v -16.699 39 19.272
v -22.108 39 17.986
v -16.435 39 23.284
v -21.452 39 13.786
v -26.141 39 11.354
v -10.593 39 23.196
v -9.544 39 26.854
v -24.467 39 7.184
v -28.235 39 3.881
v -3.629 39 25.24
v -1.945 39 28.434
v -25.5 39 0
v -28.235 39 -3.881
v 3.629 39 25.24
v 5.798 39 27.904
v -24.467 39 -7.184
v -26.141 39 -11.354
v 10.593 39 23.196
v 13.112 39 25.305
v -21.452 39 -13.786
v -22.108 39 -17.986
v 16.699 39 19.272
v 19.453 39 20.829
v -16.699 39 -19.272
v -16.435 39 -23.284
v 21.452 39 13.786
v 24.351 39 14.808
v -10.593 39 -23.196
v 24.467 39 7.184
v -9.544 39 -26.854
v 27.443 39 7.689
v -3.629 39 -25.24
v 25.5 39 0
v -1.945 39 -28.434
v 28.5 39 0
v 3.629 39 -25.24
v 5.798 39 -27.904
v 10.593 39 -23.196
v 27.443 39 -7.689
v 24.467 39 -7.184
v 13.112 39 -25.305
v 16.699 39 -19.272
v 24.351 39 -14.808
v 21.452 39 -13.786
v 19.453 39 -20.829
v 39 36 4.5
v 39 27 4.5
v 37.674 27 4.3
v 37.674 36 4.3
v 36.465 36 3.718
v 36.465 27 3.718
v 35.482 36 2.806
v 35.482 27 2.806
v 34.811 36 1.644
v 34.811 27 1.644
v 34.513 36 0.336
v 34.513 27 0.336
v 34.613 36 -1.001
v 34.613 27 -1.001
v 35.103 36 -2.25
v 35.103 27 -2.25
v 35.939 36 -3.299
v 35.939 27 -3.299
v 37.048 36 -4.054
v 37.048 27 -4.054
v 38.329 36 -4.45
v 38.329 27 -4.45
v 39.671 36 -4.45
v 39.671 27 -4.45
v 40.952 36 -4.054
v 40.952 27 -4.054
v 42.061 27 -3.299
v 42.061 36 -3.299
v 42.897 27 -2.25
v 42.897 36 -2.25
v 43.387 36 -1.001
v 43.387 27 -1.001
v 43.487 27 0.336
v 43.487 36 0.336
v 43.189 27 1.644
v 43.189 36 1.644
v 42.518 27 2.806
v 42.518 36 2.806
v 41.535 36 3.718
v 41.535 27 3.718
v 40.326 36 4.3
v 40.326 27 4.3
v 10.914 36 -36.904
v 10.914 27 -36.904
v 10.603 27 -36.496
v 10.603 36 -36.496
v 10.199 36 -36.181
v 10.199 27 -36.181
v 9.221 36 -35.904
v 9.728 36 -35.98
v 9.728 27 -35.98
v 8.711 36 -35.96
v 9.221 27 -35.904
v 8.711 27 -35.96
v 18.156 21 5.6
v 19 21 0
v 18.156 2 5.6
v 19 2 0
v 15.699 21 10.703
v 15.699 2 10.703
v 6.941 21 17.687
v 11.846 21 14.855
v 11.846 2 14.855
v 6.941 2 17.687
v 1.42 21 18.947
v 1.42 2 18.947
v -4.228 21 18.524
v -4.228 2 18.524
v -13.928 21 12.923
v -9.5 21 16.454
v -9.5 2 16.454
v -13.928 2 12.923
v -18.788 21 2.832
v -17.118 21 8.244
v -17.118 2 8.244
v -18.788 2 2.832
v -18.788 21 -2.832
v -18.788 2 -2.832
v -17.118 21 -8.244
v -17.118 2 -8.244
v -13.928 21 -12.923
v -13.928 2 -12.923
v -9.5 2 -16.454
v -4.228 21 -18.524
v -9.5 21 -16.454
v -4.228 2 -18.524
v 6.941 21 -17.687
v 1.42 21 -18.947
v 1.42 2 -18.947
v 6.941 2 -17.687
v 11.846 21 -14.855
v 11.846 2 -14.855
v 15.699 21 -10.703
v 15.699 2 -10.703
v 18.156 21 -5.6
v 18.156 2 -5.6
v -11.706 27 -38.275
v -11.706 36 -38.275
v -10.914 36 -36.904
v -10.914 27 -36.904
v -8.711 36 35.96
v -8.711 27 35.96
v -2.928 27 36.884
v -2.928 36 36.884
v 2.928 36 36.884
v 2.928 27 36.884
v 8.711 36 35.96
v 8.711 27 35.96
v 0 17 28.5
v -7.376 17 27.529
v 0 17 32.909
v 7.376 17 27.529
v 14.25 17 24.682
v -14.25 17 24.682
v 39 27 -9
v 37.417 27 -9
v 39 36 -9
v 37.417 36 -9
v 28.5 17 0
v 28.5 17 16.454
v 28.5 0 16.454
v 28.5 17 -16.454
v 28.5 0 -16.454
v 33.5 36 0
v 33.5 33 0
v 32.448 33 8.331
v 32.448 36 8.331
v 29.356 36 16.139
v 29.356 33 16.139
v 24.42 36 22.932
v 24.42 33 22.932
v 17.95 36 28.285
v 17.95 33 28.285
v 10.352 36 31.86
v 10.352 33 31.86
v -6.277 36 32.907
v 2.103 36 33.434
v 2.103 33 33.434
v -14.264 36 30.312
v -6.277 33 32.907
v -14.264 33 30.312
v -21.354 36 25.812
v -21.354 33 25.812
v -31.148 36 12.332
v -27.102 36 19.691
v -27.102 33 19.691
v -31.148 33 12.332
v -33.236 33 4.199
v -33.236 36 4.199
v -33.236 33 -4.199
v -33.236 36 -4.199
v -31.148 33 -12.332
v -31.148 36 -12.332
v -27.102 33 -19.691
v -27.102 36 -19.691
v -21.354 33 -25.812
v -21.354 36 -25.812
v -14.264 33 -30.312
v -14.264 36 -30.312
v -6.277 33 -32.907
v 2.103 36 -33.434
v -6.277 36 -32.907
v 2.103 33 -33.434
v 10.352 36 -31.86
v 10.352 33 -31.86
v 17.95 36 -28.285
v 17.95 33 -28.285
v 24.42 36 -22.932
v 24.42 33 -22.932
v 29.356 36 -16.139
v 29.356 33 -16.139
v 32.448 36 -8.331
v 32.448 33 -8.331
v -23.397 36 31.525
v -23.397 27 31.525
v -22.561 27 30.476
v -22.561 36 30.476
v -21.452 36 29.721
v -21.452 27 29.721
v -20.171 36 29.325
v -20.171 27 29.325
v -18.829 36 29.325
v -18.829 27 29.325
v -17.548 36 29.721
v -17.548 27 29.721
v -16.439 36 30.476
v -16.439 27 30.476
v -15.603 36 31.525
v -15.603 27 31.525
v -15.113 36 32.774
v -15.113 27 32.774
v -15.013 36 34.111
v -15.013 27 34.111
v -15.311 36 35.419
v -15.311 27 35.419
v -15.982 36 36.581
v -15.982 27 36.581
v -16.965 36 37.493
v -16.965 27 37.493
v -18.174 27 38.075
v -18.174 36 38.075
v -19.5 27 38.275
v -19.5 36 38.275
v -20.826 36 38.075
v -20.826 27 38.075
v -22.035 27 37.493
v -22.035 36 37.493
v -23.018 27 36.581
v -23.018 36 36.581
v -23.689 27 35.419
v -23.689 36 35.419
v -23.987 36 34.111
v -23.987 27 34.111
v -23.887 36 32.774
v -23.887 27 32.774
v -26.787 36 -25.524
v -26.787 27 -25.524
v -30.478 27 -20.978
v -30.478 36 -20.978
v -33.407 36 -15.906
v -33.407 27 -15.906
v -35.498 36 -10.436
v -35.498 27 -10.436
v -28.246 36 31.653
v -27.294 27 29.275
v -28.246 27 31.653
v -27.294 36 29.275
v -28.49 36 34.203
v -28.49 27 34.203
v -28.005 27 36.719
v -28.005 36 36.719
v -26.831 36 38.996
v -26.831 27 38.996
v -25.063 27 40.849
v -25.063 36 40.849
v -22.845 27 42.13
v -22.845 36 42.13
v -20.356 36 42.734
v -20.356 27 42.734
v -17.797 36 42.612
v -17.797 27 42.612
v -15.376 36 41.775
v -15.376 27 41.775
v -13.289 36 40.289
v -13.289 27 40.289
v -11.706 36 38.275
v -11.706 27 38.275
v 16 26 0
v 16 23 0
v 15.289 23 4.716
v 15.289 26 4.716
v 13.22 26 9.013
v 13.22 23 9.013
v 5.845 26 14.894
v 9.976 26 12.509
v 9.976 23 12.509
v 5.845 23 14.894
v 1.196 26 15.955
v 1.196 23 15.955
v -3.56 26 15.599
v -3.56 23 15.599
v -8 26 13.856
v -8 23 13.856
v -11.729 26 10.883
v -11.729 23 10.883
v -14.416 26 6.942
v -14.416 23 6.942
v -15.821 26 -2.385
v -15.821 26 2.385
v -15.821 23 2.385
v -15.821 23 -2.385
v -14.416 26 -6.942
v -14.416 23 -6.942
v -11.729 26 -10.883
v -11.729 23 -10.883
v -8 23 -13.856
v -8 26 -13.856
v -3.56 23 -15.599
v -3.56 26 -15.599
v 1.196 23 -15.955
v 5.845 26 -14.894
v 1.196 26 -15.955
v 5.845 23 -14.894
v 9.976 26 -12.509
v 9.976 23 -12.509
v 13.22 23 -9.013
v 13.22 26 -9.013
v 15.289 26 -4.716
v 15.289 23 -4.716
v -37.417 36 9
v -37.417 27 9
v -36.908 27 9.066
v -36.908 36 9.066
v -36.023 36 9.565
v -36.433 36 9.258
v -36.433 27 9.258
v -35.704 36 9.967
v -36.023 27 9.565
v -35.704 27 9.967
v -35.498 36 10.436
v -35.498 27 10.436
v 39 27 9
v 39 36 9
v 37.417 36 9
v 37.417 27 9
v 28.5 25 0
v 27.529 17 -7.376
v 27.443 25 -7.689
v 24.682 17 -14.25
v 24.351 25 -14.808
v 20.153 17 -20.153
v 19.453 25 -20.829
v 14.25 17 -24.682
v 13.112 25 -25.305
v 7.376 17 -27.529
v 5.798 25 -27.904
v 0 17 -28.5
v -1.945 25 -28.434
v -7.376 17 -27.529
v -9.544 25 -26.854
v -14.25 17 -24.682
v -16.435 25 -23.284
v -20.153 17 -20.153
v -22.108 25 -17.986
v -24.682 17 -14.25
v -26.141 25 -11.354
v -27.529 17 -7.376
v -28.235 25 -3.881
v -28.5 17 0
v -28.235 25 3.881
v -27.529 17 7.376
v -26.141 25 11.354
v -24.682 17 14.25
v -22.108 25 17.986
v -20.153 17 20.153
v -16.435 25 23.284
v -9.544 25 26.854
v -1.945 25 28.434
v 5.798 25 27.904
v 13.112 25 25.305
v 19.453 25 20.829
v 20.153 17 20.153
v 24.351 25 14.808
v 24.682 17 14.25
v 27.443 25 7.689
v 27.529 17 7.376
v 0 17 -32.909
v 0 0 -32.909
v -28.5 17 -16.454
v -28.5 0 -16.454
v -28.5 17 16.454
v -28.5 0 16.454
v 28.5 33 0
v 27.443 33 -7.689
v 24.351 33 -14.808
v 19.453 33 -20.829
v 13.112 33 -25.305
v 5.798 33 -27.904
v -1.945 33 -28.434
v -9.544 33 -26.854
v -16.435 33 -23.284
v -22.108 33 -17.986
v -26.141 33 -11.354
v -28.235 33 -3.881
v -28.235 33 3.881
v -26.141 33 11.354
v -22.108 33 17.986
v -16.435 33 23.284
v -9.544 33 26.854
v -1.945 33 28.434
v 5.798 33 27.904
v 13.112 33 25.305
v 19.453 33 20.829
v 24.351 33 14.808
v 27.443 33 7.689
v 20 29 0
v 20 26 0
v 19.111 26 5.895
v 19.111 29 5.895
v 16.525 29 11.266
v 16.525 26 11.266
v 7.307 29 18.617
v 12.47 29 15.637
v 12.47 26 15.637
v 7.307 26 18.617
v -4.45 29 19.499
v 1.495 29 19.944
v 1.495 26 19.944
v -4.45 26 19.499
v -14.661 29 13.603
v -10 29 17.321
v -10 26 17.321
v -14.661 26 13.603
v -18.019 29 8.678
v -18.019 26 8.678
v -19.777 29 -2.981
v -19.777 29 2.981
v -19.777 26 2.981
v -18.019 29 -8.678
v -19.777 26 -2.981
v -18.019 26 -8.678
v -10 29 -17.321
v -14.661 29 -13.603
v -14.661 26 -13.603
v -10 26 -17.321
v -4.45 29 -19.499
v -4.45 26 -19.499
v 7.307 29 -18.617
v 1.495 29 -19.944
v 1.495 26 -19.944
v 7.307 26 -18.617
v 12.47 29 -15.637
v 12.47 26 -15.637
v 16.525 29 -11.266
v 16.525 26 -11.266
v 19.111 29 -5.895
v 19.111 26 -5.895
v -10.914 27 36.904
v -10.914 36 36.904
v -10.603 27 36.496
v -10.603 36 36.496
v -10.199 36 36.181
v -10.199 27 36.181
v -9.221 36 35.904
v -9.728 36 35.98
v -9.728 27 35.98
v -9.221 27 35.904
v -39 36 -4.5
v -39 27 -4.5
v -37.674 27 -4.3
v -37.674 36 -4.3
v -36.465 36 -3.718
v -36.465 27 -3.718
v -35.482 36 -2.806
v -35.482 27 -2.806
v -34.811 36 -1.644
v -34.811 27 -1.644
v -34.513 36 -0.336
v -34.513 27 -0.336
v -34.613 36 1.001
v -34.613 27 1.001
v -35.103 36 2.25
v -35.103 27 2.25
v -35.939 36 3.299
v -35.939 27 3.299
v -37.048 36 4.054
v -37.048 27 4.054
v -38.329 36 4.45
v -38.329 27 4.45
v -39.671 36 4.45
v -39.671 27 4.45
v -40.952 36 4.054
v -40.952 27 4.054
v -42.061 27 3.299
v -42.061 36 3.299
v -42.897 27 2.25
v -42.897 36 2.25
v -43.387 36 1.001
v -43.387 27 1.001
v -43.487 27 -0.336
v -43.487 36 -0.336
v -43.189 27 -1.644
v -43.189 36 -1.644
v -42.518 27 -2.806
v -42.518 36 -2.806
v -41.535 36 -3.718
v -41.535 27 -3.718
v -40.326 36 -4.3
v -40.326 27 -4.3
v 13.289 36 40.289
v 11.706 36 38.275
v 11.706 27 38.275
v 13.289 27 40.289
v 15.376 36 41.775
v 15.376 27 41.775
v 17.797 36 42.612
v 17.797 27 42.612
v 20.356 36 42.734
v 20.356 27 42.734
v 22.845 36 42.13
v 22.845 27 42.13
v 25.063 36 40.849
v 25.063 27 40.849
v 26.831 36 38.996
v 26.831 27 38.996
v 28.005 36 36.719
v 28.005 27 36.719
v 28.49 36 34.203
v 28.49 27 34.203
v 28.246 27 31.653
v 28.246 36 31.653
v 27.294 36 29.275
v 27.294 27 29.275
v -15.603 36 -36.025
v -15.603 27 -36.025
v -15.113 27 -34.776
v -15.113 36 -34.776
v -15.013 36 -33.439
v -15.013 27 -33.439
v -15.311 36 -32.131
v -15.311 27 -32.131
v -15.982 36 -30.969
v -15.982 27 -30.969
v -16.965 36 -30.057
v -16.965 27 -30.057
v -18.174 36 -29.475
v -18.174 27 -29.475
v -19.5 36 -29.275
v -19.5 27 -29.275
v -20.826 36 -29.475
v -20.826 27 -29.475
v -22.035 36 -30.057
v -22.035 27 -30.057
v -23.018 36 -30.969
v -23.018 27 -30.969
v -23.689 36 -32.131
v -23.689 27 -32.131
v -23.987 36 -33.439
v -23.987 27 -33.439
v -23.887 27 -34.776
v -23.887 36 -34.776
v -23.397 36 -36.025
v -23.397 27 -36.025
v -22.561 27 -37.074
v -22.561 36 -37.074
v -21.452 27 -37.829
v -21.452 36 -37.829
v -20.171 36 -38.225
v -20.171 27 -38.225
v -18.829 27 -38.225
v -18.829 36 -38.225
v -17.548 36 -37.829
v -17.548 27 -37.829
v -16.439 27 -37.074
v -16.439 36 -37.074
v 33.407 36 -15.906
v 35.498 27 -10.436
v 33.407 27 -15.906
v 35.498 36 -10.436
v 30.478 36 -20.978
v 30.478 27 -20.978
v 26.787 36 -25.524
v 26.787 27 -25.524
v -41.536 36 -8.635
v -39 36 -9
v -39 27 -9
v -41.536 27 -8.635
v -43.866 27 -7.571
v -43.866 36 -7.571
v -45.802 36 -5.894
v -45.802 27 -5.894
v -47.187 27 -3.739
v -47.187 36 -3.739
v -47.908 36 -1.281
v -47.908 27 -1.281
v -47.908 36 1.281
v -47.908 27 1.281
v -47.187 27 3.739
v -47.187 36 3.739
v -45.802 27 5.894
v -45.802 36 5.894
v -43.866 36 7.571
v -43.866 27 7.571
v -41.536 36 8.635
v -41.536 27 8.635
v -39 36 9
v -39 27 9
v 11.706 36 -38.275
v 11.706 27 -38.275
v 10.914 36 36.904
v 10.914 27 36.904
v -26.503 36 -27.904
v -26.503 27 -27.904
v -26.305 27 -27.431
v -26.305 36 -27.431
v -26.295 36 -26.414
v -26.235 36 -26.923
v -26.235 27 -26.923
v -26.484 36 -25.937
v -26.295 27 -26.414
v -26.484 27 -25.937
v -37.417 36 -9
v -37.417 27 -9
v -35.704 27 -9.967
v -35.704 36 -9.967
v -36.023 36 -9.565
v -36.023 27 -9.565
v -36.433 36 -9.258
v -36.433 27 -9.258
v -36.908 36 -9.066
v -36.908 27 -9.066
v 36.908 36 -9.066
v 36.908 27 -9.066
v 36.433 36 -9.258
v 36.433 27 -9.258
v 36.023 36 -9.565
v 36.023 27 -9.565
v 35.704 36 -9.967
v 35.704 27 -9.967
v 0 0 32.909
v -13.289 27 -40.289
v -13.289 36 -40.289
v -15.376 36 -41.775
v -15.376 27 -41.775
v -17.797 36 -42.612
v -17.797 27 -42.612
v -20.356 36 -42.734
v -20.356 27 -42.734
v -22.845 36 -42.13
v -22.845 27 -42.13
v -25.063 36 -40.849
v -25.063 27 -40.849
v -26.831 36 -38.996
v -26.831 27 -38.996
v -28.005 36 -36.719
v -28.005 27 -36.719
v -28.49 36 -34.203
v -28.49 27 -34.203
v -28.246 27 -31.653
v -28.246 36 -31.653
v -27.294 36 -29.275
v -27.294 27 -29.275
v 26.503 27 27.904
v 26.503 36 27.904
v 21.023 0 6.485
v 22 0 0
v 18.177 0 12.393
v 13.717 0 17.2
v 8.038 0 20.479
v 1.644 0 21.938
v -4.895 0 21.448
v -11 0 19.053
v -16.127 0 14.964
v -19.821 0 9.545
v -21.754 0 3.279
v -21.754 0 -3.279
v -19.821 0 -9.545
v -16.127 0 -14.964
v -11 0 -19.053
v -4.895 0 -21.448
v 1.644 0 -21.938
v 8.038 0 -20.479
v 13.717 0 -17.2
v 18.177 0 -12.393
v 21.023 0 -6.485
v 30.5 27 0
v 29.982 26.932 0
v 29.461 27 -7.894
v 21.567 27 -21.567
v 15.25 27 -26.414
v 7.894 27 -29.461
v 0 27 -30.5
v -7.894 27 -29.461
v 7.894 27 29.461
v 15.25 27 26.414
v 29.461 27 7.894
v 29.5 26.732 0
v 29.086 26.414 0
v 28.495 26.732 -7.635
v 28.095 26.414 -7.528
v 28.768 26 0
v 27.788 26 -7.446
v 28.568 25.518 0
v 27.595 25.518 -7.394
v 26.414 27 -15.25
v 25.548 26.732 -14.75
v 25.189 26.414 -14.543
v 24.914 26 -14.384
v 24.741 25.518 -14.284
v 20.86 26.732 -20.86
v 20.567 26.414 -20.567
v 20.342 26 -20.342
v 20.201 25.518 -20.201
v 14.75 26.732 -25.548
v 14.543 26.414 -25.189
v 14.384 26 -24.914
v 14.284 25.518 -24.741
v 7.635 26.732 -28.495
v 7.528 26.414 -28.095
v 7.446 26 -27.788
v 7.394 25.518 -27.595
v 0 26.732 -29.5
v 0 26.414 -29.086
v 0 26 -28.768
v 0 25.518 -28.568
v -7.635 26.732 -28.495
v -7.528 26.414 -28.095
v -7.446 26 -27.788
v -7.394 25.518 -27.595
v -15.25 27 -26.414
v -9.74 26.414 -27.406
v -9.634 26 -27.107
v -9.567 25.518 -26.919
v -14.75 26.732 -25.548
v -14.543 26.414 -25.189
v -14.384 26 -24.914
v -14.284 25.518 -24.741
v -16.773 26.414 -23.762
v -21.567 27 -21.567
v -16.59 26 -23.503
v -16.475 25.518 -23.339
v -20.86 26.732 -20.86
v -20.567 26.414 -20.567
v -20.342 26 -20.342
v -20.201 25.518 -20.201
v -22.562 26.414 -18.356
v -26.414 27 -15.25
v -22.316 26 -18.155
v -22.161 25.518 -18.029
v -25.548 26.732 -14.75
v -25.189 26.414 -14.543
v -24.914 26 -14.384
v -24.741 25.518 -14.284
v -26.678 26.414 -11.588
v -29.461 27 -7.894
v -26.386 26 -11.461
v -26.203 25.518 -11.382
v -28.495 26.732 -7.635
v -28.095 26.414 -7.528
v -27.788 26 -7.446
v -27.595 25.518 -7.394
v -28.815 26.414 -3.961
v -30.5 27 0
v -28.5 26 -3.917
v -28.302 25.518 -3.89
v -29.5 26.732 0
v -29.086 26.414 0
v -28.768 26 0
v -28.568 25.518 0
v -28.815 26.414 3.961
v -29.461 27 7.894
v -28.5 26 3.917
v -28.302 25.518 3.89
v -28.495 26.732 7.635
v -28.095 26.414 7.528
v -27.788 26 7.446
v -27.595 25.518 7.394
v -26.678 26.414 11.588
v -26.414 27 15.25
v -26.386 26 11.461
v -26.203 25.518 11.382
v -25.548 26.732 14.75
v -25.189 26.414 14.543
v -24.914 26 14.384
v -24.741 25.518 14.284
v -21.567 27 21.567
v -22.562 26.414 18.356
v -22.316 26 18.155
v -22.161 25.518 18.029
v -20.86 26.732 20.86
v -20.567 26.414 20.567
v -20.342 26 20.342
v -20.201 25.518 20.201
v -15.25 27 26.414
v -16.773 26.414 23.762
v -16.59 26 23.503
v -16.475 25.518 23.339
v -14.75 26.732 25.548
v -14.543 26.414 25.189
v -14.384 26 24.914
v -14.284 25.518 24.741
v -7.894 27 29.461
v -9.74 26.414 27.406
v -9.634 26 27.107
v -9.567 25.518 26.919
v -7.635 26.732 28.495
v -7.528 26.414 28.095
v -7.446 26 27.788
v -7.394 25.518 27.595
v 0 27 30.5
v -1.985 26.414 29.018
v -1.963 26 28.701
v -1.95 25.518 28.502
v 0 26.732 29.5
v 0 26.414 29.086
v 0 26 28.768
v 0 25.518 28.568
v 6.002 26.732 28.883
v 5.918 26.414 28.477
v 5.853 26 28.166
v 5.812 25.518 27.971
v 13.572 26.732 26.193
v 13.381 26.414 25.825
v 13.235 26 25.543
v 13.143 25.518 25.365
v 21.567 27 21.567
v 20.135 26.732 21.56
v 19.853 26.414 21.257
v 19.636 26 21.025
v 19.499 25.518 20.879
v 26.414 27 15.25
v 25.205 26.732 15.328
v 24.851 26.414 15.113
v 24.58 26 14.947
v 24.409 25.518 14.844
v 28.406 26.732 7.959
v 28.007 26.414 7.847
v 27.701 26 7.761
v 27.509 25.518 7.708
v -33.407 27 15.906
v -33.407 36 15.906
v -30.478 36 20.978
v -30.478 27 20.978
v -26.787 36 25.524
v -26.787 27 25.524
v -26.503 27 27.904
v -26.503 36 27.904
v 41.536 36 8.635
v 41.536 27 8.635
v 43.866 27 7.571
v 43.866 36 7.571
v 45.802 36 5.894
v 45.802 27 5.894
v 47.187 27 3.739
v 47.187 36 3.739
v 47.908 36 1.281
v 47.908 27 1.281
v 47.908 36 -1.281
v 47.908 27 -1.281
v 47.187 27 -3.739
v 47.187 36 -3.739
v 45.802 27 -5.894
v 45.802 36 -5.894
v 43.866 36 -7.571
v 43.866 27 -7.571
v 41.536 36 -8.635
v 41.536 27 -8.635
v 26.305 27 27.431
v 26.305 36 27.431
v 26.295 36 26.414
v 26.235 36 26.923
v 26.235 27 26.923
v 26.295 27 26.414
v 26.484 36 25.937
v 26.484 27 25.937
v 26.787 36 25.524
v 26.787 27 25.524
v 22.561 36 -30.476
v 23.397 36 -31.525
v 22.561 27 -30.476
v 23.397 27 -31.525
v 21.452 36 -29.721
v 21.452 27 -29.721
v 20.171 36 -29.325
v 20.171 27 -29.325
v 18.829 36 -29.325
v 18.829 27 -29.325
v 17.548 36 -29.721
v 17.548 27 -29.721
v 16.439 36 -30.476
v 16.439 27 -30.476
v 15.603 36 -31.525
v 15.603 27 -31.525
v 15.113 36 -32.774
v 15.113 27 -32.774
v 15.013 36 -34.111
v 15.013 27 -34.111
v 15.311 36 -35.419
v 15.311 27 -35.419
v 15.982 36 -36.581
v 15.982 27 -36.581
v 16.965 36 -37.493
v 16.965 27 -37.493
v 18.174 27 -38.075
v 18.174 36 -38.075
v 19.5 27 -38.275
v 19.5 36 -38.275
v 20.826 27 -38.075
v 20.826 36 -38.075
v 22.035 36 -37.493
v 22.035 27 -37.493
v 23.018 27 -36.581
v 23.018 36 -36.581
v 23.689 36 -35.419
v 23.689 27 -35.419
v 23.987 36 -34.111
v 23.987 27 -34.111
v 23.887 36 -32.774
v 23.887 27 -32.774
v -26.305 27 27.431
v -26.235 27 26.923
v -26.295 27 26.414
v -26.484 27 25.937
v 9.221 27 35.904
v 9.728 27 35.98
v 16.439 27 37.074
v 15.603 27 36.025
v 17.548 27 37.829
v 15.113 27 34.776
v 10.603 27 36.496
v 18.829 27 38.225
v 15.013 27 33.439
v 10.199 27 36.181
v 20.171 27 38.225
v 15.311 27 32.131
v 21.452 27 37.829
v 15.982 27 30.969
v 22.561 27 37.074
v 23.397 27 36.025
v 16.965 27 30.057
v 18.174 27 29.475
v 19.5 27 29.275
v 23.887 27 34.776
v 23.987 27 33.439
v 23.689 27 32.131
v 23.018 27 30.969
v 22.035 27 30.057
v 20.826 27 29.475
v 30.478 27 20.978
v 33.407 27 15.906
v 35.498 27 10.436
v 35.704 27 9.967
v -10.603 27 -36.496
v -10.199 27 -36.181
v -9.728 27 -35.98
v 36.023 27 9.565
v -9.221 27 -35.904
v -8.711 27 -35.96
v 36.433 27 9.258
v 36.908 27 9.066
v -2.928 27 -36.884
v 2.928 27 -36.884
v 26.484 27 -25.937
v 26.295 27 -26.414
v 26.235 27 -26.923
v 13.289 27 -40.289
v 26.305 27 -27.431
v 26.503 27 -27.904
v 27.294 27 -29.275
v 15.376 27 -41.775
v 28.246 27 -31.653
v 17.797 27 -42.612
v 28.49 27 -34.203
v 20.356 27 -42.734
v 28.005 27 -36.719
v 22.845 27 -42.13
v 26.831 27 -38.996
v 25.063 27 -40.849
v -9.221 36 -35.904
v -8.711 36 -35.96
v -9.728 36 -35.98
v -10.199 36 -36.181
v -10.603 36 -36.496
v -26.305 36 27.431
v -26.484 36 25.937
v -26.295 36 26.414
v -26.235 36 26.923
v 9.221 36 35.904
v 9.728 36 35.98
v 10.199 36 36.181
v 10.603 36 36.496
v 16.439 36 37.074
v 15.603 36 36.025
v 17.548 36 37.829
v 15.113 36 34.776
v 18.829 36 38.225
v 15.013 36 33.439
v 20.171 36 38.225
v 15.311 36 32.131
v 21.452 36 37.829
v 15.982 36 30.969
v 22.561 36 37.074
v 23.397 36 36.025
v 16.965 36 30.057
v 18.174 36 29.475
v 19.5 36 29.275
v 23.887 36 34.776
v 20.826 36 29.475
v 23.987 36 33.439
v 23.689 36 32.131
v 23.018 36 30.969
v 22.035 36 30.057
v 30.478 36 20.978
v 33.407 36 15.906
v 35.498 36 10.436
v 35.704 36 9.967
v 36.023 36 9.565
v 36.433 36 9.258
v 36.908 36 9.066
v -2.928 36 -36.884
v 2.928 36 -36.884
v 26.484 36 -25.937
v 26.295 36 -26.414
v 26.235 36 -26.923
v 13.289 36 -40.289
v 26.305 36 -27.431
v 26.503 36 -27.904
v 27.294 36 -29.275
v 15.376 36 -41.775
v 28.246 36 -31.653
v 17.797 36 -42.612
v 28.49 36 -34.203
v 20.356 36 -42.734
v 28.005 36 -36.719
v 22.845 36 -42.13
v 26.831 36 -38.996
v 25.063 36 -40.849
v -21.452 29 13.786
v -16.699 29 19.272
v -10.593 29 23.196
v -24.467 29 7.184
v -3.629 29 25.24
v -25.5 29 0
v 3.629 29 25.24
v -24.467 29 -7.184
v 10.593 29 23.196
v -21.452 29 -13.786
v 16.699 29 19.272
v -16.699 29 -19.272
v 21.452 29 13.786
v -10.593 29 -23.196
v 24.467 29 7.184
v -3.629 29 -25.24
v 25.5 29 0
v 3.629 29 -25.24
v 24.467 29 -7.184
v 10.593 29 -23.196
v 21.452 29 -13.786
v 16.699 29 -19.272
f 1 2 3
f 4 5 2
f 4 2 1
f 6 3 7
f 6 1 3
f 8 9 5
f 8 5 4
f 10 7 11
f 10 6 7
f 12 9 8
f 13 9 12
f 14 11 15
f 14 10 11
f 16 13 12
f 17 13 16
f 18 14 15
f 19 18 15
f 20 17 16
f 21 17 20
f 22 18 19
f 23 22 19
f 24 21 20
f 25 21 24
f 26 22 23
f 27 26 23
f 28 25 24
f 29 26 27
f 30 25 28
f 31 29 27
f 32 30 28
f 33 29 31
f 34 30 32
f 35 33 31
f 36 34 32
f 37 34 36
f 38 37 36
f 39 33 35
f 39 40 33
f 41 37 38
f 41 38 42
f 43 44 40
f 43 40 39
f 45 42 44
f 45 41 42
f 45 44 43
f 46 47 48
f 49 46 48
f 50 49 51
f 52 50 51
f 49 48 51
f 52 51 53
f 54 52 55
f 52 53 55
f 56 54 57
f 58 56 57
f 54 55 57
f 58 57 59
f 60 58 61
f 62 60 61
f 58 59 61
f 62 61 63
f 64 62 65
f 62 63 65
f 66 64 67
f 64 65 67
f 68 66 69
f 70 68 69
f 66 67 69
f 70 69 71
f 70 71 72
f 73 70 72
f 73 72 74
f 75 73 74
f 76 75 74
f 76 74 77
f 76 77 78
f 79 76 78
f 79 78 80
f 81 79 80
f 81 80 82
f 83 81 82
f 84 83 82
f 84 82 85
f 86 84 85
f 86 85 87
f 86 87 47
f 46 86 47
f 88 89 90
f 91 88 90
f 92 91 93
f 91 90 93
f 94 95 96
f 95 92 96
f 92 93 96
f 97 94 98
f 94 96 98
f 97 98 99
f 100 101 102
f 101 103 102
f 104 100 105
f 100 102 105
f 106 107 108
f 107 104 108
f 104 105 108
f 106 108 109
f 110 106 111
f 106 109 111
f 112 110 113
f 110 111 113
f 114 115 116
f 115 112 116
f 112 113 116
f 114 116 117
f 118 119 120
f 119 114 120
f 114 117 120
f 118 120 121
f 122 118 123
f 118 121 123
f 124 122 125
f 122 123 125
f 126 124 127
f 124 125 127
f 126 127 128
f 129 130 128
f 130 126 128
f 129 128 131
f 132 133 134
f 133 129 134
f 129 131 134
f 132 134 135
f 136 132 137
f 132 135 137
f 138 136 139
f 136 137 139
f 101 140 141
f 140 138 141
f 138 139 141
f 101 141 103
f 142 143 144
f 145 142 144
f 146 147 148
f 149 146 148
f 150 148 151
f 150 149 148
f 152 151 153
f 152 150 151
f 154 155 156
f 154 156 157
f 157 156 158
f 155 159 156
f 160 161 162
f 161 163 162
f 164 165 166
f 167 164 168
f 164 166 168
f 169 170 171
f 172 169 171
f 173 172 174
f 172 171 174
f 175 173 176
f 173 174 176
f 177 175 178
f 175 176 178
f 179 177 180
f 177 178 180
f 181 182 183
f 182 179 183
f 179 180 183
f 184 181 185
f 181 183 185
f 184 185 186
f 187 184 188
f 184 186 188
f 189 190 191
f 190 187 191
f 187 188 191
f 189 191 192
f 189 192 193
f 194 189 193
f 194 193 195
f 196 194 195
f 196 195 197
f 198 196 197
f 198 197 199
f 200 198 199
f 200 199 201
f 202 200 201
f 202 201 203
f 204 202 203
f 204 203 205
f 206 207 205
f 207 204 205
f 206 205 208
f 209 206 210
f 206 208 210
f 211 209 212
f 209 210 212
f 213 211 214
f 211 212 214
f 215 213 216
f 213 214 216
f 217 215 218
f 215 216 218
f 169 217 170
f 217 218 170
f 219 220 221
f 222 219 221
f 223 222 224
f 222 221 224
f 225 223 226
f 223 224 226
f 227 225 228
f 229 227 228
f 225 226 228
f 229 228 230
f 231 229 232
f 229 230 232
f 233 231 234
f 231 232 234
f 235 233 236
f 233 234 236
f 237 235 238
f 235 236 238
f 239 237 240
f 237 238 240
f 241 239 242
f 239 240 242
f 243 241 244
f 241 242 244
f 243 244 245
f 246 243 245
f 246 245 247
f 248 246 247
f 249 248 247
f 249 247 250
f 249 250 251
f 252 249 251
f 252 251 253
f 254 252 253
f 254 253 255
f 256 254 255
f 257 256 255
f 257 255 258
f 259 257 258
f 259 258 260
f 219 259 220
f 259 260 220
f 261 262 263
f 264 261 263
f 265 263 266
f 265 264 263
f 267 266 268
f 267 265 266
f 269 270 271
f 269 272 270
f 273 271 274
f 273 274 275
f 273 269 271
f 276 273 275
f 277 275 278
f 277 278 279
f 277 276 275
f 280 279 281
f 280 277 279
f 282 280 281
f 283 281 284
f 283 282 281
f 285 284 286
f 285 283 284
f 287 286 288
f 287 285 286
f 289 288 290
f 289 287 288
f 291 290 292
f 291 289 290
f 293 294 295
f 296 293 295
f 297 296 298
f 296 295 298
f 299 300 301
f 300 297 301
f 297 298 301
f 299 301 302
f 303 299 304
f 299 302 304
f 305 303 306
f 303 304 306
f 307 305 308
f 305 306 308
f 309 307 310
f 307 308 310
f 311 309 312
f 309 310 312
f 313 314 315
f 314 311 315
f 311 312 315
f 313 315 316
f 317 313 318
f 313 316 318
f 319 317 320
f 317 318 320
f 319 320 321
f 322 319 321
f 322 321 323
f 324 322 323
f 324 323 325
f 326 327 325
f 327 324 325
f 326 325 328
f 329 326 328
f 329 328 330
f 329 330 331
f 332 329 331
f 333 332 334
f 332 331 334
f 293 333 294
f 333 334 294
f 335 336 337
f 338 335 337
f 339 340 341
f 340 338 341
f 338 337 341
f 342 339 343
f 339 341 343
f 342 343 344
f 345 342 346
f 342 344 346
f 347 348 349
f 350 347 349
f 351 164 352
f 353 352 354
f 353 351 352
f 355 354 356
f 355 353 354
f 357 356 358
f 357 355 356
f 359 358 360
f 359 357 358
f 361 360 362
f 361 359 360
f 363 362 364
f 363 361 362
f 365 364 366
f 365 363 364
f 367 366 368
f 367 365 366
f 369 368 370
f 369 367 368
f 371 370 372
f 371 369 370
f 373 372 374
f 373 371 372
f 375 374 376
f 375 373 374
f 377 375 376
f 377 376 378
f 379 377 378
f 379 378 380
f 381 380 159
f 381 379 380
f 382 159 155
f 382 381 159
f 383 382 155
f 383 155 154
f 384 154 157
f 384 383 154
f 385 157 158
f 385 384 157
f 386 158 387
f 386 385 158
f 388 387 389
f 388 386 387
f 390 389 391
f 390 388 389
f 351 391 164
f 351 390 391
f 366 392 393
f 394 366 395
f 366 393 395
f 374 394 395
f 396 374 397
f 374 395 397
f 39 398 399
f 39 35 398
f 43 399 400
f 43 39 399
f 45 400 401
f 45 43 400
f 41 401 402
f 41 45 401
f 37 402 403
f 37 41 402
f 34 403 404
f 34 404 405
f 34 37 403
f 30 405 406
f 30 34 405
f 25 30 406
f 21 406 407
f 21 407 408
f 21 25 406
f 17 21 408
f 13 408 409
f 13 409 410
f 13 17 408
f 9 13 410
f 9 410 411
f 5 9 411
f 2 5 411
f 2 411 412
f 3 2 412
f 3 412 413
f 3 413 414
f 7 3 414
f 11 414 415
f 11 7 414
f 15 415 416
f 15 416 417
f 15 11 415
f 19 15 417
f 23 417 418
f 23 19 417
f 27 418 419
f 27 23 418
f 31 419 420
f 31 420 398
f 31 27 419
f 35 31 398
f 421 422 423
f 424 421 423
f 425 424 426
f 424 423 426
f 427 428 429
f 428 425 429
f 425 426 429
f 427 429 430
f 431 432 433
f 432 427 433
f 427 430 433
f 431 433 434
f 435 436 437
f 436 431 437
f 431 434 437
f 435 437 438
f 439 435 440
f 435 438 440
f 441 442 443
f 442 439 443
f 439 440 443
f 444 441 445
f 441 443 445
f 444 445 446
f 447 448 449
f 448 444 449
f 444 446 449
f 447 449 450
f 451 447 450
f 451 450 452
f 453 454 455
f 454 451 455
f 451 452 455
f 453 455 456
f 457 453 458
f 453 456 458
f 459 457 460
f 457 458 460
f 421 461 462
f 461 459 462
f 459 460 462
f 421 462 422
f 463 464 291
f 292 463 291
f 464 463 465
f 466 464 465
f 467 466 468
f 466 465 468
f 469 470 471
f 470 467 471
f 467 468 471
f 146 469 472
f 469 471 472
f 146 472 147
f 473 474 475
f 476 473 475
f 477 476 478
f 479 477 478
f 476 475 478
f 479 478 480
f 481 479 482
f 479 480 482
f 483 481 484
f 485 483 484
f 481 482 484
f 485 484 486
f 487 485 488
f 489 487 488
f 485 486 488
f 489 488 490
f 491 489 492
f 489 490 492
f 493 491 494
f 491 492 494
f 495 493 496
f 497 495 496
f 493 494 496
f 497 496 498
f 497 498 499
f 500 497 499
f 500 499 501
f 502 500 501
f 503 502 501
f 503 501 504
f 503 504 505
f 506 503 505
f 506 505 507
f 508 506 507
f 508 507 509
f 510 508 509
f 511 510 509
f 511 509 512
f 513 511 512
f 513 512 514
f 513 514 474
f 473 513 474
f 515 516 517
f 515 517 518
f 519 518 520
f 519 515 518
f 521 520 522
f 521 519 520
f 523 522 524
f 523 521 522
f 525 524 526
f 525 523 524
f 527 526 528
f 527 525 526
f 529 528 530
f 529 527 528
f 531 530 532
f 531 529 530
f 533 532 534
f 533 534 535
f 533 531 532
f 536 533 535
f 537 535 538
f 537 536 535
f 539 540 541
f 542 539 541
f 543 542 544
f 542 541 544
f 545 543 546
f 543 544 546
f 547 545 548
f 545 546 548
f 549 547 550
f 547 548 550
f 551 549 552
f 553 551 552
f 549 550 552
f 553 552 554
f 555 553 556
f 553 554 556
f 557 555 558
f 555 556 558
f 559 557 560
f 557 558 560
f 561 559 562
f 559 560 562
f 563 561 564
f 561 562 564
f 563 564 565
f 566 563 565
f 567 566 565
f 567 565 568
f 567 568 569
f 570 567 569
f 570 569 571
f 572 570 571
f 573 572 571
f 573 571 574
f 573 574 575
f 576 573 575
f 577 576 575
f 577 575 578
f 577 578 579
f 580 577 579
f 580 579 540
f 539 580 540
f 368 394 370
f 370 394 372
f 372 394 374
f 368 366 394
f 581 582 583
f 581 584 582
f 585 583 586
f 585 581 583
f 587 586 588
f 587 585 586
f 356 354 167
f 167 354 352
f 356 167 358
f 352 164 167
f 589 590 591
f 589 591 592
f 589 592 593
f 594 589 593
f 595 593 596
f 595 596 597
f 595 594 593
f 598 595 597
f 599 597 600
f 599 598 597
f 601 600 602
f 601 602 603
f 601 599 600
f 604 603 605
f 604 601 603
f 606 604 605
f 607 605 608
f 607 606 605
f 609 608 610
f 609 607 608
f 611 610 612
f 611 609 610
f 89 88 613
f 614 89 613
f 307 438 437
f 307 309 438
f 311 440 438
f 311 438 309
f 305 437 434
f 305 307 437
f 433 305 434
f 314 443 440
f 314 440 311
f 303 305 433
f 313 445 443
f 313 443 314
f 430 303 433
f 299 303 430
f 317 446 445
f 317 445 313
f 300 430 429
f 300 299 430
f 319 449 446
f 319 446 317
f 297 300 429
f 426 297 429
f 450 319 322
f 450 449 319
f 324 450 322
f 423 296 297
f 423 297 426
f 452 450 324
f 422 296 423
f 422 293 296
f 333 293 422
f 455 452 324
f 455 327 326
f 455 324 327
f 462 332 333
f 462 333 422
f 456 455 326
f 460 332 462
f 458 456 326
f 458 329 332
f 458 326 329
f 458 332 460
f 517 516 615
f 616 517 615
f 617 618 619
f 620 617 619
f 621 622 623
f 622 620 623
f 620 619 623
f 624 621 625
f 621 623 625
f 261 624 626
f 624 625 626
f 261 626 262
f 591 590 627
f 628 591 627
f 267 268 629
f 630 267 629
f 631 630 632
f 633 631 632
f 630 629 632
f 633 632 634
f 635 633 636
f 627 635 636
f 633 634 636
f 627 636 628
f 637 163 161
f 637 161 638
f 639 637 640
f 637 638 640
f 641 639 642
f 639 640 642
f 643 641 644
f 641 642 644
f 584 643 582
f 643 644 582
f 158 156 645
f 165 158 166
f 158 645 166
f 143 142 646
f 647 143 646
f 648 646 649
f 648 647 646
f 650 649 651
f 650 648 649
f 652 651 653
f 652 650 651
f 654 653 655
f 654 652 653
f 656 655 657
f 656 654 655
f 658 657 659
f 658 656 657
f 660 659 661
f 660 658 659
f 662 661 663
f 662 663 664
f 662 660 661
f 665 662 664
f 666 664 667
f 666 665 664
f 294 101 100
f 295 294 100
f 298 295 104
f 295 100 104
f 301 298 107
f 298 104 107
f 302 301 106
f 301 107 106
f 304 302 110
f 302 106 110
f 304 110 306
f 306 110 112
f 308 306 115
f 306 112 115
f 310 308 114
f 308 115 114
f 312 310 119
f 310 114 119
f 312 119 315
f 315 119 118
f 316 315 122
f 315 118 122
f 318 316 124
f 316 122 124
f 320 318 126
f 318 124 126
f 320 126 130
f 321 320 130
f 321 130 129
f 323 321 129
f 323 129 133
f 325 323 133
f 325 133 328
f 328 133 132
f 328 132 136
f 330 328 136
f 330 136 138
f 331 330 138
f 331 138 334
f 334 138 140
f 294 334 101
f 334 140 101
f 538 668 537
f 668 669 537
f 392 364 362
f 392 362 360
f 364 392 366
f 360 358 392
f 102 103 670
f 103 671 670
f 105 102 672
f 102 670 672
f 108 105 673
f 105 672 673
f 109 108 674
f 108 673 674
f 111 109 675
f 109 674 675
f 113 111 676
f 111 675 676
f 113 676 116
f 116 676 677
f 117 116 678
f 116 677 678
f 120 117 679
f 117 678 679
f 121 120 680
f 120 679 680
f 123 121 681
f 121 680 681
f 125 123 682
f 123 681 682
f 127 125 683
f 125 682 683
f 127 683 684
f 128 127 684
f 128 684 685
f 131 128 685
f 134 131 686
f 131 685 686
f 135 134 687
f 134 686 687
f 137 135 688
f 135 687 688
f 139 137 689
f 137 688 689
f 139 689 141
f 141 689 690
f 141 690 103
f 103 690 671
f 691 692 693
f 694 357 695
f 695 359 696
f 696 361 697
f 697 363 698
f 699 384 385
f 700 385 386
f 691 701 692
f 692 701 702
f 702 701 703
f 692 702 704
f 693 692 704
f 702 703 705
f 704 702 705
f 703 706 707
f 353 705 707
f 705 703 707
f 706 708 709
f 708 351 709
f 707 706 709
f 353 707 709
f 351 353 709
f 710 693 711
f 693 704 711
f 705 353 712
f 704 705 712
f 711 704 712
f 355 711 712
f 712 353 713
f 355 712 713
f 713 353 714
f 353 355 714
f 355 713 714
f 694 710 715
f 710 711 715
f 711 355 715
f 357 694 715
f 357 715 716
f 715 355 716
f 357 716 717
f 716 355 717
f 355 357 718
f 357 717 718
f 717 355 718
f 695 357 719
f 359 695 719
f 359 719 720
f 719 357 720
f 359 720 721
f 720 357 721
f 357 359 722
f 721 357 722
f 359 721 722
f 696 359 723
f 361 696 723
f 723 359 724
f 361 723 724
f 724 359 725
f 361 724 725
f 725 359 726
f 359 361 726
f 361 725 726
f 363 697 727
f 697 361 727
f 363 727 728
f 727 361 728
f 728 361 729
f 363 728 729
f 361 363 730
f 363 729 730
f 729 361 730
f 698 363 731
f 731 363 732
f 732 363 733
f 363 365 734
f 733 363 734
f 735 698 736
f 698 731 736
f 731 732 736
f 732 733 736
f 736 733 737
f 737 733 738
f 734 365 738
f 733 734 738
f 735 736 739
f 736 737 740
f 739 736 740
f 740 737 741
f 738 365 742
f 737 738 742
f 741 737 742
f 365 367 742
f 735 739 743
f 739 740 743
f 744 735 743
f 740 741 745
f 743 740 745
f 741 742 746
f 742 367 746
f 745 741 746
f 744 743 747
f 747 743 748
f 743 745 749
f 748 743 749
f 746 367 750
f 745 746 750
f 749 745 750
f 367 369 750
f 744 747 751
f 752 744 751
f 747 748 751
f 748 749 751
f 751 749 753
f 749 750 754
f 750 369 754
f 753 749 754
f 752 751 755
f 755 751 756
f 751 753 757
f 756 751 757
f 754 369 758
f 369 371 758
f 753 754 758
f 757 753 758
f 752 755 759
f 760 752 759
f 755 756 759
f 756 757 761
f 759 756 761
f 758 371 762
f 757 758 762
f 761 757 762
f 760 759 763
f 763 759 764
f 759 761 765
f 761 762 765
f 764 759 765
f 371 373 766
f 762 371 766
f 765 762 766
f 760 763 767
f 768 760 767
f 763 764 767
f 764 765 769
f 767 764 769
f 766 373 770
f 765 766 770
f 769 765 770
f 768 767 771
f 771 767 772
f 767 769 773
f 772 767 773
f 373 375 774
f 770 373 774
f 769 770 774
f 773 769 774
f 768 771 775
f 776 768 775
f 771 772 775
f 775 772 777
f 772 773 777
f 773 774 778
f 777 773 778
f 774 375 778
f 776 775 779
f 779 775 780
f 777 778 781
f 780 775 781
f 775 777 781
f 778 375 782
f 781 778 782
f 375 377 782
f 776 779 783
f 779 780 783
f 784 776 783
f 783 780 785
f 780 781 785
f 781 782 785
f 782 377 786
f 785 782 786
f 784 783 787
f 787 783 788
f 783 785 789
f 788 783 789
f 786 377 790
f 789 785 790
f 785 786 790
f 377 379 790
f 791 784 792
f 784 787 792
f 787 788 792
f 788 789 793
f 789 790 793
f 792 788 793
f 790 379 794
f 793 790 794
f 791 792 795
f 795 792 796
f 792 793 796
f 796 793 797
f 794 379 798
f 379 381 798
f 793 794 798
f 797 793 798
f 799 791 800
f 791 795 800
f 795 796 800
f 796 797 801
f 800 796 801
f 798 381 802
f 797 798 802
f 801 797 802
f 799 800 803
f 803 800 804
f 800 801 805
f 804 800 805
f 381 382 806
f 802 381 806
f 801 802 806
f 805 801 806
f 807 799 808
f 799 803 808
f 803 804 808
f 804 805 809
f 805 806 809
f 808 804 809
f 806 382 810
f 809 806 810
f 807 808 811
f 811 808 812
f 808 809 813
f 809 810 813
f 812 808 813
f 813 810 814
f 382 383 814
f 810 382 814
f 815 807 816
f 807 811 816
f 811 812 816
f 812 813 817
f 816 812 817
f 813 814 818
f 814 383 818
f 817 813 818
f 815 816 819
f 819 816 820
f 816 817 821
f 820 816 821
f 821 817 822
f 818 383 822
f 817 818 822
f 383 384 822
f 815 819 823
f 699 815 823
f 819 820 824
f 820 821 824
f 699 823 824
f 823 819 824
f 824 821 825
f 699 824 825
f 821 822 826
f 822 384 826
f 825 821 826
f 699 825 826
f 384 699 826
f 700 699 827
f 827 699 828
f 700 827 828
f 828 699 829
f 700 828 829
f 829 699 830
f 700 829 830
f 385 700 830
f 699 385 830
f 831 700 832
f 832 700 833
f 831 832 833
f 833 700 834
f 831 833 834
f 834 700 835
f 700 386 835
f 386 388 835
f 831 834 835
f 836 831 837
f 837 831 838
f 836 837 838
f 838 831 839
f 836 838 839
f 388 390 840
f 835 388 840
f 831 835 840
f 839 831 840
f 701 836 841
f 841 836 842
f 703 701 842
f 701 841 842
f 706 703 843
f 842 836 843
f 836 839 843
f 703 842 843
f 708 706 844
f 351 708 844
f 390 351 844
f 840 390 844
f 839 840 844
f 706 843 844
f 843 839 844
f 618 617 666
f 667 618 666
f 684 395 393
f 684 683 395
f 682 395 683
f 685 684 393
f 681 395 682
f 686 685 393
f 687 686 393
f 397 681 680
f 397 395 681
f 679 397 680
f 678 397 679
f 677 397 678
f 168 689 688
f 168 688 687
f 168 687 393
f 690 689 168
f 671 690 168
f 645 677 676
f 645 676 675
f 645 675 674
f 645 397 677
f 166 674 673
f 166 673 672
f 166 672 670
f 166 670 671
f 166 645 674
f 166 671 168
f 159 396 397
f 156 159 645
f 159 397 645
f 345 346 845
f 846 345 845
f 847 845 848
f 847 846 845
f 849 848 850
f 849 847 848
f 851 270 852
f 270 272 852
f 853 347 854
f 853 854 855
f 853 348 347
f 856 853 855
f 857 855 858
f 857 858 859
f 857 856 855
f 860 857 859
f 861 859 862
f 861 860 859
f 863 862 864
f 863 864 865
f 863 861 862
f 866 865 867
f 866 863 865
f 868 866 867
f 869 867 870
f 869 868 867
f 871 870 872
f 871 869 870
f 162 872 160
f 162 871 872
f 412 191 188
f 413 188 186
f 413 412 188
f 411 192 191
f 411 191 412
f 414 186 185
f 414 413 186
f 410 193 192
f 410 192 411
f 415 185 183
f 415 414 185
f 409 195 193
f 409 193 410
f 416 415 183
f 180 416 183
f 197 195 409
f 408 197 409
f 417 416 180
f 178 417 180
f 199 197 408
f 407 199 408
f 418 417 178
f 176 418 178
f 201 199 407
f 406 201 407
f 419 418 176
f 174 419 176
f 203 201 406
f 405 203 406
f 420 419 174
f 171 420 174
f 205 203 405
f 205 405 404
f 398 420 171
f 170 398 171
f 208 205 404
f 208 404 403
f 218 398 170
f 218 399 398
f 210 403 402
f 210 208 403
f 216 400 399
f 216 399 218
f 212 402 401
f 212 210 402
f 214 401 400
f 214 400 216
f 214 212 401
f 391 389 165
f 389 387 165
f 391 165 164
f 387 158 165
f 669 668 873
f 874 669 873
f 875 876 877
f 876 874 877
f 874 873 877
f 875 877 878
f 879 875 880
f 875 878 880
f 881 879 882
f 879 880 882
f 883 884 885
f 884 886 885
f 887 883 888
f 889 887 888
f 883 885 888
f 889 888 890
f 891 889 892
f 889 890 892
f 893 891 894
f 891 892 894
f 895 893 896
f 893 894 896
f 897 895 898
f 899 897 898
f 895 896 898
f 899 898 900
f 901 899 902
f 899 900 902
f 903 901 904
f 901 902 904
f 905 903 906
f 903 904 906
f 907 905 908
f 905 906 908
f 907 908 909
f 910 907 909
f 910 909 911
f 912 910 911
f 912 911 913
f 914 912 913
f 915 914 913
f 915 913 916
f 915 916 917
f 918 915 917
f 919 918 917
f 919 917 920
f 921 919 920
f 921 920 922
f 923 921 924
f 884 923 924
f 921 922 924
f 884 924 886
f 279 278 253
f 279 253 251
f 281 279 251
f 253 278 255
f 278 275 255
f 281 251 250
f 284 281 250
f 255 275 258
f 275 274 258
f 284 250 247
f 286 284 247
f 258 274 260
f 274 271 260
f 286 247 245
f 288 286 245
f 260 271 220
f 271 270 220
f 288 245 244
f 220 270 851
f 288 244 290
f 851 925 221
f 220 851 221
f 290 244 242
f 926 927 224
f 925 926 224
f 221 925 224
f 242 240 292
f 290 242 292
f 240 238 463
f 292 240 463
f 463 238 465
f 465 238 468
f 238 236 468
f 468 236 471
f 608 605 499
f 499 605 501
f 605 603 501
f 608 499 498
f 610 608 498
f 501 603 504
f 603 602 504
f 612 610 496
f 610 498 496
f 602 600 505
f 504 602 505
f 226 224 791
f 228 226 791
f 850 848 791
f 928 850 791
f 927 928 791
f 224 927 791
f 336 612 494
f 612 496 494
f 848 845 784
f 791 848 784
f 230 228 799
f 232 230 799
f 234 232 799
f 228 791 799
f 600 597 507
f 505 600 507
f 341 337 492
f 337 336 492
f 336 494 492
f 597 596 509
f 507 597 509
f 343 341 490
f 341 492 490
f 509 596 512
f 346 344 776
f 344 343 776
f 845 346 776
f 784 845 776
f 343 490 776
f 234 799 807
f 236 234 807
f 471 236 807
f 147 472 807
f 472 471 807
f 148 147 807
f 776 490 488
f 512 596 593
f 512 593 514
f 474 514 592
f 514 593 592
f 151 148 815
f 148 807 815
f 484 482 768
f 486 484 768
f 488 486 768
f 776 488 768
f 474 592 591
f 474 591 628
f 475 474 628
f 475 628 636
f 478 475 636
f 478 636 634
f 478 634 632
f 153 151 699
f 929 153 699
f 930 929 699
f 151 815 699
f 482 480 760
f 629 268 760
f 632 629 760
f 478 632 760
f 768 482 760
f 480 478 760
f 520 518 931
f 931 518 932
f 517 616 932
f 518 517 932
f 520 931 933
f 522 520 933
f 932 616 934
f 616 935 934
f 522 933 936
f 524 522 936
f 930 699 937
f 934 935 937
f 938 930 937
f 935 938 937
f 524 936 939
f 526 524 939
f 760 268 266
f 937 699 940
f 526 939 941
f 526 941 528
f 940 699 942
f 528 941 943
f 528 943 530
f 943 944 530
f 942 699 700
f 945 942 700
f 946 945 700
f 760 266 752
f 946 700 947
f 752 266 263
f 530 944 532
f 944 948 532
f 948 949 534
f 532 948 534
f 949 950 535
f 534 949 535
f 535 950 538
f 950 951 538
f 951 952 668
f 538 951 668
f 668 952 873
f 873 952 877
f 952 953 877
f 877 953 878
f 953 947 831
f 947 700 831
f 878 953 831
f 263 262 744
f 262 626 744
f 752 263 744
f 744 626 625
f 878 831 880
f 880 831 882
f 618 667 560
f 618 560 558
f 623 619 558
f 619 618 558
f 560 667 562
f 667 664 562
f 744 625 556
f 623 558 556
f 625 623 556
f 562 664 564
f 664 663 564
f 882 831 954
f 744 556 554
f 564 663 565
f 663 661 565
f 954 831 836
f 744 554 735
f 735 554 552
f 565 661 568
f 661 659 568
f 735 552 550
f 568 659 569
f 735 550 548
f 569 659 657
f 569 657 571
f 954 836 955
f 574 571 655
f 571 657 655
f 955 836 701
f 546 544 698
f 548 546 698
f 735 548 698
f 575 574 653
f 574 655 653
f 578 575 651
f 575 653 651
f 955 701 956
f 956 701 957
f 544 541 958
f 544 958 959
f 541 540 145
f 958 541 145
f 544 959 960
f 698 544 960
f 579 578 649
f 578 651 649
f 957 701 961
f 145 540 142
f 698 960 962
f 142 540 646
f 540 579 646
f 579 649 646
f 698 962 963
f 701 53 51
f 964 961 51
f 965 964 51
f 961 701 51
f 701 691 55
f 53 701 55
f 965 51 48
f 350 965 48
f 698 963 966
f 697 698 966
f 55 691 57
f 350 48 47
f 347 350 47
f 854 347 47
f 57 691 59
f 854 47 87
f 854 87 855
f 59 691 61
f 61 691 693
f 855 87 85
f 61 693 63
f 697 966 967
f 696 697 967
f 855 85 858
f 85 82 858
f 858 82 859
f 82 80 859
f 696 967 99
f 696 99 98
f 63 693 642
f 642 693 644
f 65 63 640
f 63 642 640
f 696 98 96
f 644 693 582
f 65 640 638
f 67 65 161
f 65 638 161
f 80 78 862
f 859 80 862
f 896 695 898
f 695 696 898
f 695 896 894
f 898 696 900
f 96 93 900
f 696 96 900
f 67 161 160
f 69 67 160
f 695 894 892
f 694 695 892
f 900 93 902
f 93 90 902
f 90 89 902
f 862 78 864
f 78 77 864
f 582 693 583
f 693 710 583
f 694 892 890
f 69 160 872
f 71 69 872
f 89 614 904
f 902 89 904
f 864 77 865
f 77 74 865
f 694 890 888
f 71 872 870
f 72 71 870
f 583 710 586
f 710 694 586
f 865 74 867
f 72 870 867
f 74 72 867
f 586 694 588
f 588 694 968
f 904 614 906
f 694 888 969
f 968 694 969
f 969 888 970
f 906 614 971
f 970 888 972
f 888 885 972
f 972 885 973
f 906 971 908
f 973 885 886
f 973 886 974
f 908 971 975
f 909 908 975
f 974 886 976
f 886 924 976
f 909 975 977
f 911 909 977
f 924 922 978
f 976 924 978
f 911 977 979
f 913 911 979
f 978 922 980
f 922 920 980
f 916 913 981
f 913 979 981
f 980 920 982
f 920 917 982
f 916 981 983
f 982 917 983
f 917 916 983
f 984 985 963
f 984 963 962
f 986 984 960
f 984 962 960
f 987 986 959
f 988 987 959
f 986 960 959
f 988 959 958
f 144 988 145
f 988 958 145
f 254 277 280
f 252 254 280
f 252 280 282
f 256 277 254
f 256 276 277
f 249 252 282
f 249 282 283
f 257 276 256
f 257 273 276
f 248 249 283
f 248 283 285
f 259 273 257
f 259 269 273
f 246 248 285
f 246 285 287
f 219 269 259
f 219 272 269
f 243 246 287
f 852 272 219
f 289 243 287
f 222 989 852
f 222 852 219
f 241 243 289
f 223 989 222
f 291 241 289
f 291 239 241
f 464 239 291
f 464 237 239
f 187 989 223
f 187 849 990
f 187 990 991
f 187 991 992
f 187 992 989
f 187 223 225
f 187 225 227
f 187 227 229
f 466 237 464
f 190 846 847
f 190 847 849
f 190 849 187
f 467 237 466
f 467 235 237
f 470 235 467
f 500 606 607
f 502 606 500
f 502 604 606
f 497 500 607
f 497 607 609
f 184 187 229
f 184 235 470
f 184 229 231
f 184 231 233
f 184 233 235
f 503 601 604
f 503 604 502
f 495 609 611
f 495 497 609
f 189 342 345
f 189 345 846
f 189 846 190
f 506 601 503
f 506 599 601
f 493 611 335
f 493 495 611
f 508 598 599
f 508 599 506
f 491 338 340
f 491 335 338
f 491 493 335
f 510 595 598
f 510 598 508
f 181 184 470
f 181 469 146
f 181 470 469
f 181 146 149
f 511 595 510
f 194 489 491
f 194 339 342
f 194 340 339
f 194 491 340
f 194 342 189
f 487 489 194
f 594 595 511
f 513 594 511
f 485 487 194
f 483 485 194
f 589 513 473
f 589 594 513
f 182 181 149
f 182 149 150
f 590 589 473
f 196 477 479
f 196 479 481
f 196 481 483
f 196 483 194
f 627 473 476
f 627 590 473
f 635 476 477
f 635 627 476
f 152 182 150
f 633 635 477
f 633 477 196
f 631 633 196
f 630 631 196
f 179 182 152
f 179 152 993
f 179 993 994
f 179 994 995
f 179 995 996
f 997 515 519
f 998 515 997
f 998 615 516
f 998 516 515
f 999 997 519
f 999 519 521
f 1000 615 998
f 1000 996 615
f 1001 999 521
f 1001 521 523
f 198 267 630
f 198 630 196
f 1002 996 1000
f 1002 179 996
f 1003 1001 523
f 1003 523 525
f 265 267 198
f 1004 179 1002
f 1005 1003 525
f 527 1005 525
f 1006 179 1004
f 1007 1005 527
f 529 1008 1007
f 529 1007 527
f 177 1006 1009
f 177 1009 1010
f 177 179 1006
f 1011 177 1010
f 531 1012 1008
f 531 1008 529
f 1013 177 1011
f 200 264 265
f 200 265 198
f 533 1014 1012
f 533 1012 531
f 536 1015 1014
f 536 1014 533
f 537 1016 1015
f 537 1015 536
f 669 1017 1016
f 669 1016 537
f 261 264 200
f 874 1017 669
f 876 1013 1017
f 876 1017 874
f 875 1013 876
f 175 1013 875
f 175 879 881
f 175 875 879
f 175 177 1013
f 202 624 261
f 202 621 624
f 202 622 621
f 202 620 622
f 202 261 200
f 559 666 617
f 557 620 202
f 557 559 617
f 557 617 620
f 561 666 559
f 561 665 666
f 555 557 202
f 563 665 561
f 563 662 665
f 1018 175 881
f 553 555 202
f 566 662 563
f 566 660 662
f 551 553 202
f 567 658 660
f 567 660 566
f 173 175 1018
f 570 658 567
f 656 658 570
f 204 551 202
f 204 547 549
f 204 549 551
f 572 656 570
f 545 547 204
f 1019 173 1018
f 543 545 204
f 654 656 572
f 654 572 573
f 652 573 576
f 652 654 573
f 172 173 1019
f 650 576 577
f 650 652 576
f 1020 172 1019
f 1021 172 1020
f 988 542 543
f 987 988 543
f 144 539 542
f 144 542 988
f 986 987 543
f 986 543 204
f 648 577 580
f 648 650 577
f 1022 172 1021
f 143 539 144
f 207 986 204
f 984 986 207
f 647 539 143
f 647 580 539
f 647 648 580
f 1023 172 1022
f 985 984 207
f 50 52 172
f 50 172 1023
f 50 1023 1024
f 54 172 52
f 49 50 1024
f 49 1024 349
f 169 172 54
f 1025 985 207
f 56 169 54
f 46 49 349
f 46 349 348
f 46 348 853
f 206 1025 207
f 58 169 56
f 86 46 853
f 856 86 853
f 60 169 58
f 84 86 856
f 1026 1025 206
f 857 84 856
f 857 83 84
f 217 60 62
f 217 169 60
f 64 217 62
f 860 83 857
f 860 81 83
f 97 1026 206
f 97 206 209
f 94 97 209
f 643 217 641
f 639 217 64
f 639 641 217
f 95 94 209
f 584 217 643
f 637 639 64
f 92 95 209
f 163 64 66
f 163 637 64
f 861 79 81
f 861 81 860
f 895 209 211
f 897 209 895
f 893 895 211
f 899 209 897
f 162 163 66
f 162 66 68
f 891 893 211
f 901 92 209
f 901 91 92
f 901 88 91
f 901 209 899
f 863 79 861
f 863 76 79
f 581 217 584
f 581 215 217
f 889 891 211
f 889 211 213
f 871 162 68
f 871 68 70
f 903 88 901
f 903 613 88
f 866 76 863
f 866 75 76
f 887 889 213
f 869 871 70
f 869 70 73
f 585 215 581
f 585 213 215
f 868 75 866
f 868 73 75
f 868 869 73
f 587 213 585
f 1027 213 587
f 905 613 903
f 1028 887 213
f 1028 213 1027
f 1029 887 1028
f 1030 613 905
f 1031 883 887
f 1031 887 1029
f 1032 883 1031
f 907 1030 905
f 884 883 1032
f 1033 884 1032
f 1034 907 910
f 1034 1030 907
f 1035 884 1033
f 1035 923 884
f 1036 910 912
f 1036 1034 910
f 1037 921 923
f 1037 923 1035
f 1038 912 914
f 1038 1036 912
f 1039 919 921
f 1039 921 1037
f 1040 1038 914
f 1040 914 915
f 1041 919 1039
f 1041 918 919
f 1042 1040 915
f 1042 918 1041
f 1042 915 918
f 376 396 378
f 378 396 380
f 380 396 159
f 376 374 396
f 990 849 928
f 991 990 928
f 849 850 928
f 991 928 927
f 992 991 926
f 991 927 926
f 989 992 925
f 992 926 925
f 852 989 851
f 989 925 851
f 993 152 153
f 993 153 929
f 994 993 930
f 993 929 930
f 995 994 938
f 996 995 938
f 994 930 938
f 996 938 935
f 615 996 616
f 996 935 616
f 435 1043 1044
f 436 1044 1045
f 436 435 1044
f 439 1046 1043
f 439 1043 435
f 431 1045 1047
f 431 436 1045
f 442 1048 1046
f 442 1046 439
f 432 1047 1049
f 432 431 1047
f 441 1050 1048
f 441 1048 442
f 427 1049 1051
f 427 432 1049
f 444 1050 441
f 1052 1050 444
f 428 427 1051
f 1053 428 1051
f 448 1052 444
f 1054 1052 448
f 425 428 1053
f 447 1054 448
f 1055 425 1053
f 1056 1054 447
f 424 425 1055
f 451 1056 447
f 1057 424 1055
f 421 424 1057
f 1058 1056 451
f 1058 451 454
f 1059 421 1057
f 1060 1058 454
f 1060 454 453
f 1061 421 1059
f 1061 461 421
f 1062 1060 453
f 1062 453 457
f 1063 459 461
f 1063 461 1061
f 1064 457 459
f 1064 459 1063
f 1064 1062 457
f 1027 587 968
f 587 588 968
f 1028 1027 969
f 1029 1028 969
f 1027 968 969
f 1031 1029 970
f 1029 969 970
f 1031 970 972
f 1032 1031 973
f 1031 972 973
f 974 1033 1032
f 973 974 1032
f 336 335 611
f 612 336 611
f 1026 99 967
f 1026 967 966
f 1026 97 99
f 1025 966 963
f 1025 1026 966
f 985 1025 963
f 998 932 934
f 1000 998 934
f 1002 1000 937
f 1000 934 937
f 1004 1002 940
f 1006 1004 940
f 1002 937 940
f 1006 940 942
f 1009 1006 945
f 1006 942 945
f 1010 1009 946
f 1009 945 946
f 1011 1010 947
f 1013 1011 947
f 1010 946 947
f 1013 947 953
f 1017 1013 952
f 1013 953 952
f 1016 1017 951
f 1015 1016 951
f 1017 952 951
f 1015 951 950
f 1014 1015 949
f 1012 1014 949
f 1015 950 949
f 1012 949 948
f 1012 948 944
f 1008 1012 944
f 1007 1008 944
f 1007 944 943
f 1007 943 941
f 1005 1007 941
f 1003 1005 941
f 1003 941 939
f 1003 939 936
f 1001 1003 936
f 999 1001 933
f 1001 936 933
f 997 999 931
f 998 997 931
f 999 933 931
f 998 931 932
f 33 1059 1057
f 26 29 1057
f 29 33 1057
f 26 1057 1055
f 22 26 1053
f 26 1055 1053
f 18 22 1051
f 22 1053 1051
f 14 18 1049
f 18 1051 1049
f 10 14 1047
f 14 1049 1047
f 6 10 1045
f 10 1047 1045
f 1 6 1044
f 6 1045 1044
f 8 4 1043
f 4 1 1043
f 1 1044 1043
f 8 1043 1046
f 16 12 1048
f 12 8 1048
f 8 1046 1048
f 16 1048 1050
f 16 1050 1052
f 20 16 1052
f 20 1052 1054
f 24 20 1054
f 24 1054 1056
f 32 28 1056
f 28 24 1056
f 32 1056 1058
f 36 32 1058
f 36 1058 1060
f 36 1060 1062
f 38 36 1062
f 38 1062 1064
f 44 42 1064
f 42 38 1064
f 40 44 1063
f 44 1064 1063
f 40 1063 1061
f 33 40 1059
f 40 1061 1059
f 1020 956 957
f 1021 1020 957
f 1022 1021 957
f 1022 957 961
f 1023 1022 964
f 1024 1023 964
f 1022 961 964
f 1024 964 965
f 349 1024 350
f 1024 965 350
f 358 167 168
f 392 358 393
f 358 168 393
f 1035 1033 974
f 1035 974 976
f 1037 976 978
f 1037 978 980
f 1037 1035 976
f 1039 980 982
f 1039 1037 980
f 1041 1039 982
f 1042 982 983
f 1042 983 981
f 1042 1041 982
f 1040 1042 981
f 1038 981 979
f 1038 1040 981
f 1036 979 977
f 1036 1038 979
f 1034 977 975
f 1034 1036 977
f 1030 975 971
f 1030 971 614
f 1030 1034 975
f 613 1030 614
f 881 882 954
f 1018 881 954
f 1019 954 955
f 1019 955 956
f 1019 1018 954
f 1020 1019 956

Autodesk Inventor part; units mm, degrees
ref_plane "YZ Plane" through (0, 0, 0) normal (1, 0, 0) x (0, 1, 0)
ref_plane "XZ Plane" through (0, 0, 0) normal (0, 1, 0) x (-1, 0, 0)
ref_plane "XY Plane" through (0, 0, 0) normal (0, 0, 1) x (1, 0, 0)
sketch "Sketch1" plane through (0, 0, 0) normal (0, 0, 1) x (1, 0, 0)
  line L0 (-3.9, 0) -> (50.7, 0)
  line L1 (0, -3.9) -> (0, 50.7)
  line L2 (28.5, 0) -> (28.5, 27)
  line L3 (28.5, 27) -> (37, 27)
  line L4 (37, 27) -> (37, 36)
  line L5 (37, 36) -> (33.5, 36)
  line L6 (33.5, 36) -> (33.5, 33)
  line L7 (33.5, 33) -> (28.5, 33)
  line L8 (28.5, 33) -> (28.5, 39)
  line L9 (28.5, 39) -> (25.5, 39)
  line L10 (25.5, 39) -> (25.5, 29)
  line L11 (25.5, 29) -> (20, 29)
  line L12 (20, 29) -> (20, 26)
  line L13 (20, 26) -> (16, 26)
  line L14 (16, 26) -> (16, 23)
  line L15 (16, 23) -> (19, 21)
  line L16 (19, 21) -> (19, 2)
  line L17 (19, 2) -> (22, 0)
  line L18 (22, 0) -> (28.5, 0)
  dimension "d0" = 3
  dimension "d1" = 32
  dimension "d2" = 38
  dimension "d3" = 57
  dimension "d4" = 40
  dimension "d5" = 51
  dimension "d6" = 57
  dimension "d7" = 74
  dimension "d8" = 5
  dimension "d9" = 2
  dimension "d10" = 21
  dimension "d11" = 23
  dimension "d12" = 26
  dimension "d13" = 29
  dimension "d14" = 27
  dimension "d15" = 33
  dimension "d16" = 36
  dimension "d17" = 39
revolve "Revolution1" add sketch "Sketch1" angle 360 about axis through (0, -10, 0) along (0, 1, 0)
fillet "Fillet1" radius 2 1 edges at (-28.5, 27, 0)
sketch "Sketch2" plane through (0, 0, 0) normal (0, -1, 0) x (1, 0, 0)
  circle A0 centre (0, 0) radius 28.5
  line L0 (-44.4, 0) -> (59.2, 0)
  line L1 (0, -44.4) -> (0, 59.2)
  line L2 (0, 32.909) -> (28.5, 16.4545)
  line L3 (28.5, 16.4545) -> (28.5, -16.4545)
  line L4 (28.5, -16.4545) -> (0, -32.909)
  line L5 (0, -32.909) -> (-28.5, -16.4545)
  line L6 (-28.5, -16.4545) -> (-28.5, 16.4545)
  line L7 (-28.5, 16.4545) -> (0, 32.909)
extrude "Extrusion1" add sketch "Sketch2" against normal blind 17 contours L3 L4 A0 | A0 L2 L3 | A0 L1 L2 | L4 L1 A0 | A0 L7 L1 | L1 L5 A0 | L6 L7 A0 | A0 L5 L6
thread "Thread1"
sketch "Sketch3" plane through (0, 36, 0) normal (0, 1, 0) x (1, 0, 0)
  circle A0 centre (0, 0) radius 37
  line L0 (-59.2, 0) -> (44.4, 0)
  line L1 (0, 44.4) -> (0, -59.2)
  line L2 (35.8887, 9) -> (39, 9)
  arc A1 (39, -9) -> (39, 9) centre (39, 0) ccw
  line L3 (39, -9) -> (35.8887, -9)
  dimension "d24" = 9
  dimension "d25" = 78
extrude "Extrusion2" add sketch "Sketch3" against normal blind 9 contours A0 L2 A1 L3
fillet "Fillet2" radius 2 2 edges at (35.8887, 31.5, 9) (35.8887, 31.5, -9)
sketch "Sketch4" plane through (39, 36, 0) normal (0, 1, 0) x (1, 0, 0)
  arc A0 (0, -9) -> (0, 9) centre (0, 0) ccw
hole "Hole1" at (39, 36, 0) direction (0, -1, 0) diameter 9 end through all
pattern_circular "Circular Pattern1" count 6 over 360 about axis through (0, 11.5, 0) along (0, -1, 0) of "Extrusion2", "Fillet2", "Hole1"
properties part number "Body Cap" material "Bronze, Soft Tin"
